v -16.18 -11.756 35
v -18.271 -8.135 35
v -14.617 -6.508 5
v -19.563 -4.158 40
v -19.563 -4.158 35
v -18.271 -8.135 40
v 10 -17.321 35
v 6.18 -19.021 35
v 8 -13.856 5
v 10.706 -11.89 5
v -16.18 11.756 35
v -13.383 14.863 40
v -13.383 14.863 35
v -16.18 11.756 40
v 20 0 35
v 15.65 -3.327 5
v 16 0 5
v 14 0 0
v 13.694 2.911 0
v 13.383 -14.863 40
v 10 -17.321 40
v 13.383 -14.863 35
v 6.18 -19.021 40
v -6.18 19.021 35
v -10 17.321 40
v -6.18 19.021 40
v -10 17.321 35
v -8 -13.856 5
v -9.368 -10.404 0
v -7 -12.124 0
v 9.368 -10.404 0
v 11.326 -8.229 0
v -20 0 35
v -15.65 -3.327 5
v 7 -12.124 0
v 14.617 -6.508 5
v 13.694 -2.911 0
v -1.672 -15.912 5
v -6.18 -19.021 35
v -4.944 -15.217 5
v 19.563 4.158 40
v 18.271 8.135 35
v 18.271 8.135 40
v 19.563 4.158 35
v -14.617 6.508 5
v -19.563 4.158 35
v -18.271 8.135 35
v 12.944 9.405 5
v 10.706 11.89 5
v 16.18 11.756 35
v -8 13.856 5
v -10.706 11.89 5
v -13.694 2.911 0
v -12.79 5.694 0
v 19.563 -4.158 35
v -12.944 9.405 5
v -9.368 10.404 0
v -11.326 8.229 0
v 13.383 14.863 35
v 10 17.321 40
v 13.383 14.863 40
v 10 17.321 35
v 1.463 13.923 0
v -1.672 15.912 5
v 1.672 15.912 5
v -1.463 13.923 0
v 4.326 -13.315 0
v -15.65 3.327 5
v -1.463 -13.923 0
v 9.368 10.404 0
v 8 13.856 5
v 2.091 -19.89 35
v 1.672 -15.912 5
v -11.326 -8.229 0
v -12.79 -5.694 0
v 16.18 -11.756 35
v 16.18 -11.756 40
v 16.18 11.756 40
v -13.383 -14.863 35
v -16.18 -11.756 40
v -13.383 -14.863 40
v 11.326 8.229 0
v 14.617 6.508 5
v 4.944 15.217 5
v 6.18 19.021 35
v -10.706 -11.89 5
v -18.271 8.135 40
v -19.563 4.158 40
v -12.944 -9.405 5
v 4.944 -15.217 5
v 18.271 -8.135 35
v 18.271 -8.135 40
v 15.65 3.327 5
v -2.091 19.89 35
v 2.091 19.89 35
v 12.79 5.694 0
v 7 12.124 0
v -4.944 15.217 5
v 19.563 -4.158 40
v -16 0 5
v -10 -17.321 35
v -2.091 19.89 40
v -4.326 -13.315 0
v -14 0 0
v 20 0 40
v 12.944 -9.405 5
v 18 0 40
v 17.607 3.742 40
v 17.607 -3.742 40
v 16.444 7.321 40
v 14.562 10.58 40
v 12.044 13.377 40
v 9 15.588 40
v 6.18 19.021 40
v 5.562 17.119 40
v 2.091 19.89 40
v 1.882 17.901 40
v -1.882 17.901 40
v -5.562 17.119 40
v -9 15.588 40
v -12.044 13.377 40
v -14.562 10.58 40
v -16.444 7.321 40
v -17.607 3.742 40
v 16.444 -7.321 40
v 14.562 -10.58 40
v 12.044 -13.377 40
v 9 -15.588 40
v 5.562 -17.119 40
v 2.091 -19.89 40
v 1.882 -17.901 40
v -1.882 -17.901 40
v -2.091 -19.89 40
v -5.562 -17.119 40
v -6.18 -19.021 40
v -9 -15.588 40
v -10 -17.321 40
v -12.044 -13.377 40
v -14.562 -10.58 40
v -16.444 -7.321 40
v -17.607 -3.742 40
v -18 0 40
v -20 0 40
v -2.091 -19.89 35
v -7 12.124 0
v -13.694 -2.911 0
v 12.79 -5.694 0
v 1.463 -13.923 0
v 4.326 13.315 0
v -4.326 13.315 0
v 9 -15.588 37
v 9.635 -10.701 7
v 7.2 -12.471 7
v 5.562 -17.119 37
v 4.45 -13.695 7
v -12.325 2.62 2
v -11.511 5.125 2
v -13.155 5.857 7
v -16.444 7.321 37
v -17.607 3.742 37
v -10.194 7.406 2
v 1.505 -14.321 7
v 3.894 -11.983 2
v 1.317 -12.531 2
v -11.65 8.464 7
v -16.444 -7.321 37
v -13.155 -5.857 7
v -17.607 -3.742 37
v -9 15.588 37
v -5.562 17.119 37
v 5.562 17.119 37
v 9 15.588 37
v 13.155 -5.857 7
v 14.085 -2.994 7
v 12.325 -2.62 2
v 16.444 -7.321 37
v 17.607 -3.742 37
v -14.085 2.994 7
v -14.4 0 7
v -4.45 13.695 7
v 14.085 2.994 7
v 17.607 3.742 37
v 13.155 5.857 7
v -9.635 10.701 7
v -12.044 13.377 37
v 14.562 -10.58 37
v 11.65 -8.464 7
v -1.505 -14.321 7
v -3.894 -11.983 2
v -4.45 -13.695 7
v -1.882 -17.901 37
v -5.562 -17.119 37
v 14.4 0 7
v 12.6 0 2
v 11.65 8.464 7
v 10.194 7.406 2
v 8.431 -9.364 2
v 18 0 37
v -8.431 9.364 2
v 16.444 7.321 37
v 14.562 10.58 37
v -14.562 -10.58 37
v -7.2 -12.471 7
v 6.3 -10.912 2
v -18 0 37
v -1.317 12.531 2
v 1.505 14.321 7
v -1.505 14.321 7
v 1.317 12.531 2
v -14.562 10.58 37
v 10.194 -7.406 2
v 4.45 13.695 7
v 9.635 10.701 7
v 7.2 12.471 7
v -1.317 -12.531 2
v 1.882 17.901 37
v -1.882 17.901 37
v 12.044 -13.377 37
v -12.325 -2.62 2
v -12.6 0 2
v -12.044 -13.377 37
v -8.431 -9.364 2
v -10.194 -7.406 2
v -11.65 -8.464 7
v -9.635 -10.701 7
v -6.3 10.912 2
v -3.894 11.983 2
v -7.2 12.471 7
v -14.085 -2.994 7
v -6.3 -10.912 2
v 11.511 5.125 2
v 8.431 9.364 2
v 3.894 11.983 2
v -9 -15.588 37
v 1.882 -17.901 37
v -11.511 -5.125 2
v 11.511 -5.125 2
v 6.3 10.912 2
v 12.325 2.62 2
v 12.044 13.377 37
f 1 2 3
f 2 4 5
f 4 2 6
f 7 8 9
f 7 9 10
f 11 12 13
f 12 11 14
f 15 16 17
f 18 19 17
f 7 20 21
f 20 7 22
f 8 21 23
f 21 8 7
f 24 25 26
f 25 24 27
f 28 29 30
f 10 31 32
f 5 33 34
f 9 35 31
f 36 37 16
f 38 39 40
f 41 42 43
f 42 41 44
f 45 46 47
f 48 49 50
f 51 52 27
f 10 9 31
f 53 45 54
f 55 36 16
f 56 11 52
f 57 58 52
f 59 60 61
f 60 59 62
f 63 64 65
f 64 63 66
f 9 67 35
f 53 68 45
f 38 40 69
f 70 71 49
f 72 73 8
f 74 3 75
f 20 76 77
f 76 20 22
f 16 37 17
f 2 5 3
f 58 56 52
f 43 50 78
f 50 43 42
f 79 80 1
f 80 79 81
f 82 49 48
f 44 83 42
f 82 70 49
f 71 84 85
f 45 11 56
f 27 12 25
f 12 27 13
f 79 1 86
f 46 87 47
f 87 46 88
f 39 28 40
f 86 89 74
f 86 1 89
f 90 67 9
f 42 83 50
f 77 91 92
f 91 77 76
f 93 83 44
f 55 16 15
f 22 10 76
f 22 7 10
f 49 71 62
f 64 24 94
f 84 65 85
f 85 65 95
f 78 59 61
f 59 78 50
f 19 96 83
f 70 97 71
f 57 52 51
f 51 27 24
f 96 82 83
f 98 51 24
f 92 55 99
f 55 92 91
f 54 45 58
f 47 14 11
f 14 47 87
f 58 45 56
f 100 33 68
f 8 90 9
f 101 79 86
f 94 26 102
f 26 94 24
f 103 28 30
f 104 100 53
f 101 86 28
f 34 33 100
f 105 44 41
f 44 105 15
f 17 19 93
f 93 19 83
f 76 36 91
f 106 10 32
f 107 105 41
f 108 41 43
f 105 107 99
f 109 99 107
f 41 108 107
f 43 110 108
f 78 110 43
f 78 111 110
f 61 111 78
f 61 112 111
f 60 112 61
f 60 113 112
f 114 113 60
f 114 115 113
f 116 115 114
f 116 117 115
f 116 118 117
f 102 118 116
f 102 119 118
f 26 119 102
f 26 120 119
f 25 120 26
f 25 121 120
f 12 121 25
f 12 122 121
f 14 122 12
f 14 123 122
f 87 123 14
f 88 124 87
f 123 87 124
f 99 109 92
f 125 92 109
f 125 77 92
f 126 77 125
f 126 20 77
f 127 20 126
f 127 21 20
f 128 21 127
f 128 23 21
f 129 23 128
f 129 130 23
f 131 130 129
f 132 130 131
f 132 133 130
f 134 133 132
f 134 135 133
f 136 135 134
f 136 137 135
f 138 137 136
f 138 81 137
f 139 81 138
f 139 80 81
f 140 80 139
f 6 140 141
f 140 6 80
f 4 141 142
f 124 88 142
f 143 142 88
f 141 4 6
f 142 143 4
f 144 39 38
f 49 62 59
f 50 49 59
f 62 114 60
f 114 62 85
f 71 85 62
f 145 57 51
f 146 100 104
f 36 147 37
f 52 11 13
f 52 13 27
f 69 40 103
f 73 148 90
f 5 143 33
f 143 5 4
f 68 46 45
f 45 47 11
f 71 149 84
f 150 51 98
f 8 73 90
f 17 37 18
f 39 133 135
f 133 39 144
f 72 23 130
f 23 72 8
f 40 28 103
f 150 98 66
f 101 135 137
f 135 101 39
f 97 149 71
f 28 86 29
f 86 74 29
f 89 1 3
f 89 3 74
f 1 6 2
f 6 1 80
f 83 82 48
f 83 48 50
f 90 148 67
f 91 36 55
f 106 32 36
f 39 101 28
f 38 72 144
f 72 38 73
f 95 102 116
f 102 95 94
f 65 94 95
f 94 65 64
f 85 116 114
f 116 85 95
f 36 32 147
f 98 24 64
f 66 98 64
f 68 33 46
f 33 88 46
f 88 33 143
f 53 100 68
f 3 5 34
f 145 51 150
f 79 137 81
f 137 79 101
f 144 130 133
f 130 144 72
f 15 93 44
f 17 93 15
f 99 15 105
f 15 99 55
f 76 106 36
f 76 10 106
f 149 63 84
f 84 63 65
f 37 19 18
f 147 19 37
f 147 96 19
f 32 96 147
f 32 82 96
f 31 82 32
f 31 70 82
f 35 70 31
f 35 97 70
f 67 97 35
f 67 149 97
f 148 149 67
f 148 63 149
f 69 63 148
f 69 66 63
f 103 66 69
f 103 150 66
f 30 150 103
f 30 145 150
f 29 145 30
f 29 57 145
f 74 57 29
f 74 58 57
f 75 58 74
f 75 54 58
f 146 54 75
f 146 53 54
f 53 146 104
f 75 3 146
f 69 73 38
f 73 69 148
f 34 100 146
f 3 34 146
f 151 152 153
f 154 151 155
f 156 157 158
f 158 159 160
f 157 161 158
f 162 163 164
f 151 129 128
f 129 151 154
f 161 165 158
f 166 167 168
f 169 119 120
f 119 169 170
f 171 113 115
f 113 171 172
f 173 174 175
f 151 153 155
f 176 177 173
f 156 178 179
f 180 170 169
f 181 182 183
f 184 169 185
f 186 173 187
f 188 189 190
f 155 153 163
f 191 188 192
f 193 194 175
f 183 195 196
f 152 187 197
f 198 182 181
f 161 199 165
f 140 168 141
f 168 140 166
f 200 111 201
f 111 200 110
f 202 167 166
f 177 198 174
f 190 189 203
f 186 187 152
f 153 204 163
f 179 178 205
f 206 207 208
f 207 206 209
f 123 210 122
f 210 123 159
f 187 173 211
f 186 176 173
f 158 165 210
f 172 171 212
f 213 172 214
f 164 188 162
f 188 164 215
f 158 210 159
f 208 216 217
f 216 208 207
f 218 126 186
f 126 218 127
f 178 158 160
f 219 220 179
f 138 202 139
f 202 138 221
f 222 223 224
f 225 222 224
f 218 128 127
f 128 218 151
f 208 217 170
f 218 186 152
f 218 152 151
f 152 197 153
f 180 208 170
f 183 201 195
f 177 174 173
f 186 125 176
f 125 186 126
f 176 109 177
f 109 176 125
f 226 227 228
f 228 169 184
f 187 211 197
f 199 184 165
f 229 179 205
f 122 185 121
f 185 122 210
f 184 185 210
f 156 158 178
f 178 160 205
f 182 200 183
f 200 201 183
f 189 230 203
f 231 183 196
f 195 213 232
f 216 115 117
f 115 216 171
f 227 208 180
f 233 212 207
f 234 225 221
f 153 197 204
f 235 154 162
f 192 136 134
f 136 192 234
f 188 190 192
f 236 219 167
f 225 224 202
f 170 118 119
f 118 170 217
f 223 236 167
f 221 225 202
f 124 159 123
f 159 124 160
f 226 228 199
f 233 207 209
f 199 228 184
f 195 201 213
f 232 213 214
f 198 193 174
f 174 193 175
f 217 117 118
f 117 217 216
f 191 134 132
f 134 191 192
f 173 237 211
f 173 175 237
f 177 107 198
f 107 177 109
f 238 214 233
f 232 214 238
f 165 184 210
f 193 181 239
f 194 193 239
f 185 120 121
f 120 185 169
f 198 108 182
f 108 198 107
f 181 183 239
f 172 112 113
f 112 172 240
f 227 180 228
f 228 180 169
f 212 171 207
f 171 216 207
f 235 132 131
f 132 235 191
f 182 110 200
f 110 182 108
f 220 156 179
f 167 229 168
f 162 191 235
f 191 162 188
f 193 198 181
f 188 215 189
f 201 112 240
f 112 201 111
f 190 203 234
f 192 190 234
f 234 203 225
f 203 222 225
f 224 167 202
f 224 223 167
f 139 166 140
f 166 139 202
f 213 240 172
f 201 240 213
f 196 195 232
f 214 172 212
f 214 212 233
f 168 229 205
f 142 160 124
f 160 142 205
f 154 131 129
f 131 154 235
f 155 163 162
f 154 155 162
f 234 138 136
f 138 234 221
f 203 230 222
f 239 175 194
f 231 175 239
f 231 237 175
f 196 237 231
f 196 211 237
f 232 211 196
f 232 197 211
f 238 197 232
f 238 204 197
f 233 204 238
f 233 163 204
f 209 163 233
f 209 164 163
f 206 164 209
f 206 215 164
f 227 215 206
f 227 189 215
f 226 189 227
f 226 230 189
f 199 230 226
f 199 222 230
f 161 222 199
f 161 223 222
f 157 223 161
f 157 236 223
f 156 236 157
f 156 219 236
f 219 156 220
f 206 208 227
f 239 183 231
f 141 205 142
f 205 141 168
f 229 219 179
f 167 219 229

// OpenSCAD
height = 35;
r_top = 20;
r_bottom = 15;
r_hole = 3;
wall = 2;
rim = 5;

$fs=1;

pot();

module pot() {
    difference() {
        bowl();
        //holes();
    }
}

module holes() {
    for(d = [0:120:360]) {
        rotate([0, 0, d])
        translate([r_bottom/2, 0, -1])
        union() {
            cylinder(rim, r_hole, r_hole);
            translate([r_bottom/2 - 3, 0, 1]) cube([10, 1, rim], center=true);
        }
    }
}

module bowl() {
    difference() {
        shell();
        r_inner_fac = (r_top - wall)/r_top;
        translate([0, 0, wall]) scale([r_inner_fac, r_inner_fac, 1]) shell();
    }
}

module shell() {
    hull() {
        union() {
            translate([0, 0, height]) cylinder(rim, r_top, r_top);
            cylinder(rim, r_bottom-1, r_bottom+1);
        }
    }
}
